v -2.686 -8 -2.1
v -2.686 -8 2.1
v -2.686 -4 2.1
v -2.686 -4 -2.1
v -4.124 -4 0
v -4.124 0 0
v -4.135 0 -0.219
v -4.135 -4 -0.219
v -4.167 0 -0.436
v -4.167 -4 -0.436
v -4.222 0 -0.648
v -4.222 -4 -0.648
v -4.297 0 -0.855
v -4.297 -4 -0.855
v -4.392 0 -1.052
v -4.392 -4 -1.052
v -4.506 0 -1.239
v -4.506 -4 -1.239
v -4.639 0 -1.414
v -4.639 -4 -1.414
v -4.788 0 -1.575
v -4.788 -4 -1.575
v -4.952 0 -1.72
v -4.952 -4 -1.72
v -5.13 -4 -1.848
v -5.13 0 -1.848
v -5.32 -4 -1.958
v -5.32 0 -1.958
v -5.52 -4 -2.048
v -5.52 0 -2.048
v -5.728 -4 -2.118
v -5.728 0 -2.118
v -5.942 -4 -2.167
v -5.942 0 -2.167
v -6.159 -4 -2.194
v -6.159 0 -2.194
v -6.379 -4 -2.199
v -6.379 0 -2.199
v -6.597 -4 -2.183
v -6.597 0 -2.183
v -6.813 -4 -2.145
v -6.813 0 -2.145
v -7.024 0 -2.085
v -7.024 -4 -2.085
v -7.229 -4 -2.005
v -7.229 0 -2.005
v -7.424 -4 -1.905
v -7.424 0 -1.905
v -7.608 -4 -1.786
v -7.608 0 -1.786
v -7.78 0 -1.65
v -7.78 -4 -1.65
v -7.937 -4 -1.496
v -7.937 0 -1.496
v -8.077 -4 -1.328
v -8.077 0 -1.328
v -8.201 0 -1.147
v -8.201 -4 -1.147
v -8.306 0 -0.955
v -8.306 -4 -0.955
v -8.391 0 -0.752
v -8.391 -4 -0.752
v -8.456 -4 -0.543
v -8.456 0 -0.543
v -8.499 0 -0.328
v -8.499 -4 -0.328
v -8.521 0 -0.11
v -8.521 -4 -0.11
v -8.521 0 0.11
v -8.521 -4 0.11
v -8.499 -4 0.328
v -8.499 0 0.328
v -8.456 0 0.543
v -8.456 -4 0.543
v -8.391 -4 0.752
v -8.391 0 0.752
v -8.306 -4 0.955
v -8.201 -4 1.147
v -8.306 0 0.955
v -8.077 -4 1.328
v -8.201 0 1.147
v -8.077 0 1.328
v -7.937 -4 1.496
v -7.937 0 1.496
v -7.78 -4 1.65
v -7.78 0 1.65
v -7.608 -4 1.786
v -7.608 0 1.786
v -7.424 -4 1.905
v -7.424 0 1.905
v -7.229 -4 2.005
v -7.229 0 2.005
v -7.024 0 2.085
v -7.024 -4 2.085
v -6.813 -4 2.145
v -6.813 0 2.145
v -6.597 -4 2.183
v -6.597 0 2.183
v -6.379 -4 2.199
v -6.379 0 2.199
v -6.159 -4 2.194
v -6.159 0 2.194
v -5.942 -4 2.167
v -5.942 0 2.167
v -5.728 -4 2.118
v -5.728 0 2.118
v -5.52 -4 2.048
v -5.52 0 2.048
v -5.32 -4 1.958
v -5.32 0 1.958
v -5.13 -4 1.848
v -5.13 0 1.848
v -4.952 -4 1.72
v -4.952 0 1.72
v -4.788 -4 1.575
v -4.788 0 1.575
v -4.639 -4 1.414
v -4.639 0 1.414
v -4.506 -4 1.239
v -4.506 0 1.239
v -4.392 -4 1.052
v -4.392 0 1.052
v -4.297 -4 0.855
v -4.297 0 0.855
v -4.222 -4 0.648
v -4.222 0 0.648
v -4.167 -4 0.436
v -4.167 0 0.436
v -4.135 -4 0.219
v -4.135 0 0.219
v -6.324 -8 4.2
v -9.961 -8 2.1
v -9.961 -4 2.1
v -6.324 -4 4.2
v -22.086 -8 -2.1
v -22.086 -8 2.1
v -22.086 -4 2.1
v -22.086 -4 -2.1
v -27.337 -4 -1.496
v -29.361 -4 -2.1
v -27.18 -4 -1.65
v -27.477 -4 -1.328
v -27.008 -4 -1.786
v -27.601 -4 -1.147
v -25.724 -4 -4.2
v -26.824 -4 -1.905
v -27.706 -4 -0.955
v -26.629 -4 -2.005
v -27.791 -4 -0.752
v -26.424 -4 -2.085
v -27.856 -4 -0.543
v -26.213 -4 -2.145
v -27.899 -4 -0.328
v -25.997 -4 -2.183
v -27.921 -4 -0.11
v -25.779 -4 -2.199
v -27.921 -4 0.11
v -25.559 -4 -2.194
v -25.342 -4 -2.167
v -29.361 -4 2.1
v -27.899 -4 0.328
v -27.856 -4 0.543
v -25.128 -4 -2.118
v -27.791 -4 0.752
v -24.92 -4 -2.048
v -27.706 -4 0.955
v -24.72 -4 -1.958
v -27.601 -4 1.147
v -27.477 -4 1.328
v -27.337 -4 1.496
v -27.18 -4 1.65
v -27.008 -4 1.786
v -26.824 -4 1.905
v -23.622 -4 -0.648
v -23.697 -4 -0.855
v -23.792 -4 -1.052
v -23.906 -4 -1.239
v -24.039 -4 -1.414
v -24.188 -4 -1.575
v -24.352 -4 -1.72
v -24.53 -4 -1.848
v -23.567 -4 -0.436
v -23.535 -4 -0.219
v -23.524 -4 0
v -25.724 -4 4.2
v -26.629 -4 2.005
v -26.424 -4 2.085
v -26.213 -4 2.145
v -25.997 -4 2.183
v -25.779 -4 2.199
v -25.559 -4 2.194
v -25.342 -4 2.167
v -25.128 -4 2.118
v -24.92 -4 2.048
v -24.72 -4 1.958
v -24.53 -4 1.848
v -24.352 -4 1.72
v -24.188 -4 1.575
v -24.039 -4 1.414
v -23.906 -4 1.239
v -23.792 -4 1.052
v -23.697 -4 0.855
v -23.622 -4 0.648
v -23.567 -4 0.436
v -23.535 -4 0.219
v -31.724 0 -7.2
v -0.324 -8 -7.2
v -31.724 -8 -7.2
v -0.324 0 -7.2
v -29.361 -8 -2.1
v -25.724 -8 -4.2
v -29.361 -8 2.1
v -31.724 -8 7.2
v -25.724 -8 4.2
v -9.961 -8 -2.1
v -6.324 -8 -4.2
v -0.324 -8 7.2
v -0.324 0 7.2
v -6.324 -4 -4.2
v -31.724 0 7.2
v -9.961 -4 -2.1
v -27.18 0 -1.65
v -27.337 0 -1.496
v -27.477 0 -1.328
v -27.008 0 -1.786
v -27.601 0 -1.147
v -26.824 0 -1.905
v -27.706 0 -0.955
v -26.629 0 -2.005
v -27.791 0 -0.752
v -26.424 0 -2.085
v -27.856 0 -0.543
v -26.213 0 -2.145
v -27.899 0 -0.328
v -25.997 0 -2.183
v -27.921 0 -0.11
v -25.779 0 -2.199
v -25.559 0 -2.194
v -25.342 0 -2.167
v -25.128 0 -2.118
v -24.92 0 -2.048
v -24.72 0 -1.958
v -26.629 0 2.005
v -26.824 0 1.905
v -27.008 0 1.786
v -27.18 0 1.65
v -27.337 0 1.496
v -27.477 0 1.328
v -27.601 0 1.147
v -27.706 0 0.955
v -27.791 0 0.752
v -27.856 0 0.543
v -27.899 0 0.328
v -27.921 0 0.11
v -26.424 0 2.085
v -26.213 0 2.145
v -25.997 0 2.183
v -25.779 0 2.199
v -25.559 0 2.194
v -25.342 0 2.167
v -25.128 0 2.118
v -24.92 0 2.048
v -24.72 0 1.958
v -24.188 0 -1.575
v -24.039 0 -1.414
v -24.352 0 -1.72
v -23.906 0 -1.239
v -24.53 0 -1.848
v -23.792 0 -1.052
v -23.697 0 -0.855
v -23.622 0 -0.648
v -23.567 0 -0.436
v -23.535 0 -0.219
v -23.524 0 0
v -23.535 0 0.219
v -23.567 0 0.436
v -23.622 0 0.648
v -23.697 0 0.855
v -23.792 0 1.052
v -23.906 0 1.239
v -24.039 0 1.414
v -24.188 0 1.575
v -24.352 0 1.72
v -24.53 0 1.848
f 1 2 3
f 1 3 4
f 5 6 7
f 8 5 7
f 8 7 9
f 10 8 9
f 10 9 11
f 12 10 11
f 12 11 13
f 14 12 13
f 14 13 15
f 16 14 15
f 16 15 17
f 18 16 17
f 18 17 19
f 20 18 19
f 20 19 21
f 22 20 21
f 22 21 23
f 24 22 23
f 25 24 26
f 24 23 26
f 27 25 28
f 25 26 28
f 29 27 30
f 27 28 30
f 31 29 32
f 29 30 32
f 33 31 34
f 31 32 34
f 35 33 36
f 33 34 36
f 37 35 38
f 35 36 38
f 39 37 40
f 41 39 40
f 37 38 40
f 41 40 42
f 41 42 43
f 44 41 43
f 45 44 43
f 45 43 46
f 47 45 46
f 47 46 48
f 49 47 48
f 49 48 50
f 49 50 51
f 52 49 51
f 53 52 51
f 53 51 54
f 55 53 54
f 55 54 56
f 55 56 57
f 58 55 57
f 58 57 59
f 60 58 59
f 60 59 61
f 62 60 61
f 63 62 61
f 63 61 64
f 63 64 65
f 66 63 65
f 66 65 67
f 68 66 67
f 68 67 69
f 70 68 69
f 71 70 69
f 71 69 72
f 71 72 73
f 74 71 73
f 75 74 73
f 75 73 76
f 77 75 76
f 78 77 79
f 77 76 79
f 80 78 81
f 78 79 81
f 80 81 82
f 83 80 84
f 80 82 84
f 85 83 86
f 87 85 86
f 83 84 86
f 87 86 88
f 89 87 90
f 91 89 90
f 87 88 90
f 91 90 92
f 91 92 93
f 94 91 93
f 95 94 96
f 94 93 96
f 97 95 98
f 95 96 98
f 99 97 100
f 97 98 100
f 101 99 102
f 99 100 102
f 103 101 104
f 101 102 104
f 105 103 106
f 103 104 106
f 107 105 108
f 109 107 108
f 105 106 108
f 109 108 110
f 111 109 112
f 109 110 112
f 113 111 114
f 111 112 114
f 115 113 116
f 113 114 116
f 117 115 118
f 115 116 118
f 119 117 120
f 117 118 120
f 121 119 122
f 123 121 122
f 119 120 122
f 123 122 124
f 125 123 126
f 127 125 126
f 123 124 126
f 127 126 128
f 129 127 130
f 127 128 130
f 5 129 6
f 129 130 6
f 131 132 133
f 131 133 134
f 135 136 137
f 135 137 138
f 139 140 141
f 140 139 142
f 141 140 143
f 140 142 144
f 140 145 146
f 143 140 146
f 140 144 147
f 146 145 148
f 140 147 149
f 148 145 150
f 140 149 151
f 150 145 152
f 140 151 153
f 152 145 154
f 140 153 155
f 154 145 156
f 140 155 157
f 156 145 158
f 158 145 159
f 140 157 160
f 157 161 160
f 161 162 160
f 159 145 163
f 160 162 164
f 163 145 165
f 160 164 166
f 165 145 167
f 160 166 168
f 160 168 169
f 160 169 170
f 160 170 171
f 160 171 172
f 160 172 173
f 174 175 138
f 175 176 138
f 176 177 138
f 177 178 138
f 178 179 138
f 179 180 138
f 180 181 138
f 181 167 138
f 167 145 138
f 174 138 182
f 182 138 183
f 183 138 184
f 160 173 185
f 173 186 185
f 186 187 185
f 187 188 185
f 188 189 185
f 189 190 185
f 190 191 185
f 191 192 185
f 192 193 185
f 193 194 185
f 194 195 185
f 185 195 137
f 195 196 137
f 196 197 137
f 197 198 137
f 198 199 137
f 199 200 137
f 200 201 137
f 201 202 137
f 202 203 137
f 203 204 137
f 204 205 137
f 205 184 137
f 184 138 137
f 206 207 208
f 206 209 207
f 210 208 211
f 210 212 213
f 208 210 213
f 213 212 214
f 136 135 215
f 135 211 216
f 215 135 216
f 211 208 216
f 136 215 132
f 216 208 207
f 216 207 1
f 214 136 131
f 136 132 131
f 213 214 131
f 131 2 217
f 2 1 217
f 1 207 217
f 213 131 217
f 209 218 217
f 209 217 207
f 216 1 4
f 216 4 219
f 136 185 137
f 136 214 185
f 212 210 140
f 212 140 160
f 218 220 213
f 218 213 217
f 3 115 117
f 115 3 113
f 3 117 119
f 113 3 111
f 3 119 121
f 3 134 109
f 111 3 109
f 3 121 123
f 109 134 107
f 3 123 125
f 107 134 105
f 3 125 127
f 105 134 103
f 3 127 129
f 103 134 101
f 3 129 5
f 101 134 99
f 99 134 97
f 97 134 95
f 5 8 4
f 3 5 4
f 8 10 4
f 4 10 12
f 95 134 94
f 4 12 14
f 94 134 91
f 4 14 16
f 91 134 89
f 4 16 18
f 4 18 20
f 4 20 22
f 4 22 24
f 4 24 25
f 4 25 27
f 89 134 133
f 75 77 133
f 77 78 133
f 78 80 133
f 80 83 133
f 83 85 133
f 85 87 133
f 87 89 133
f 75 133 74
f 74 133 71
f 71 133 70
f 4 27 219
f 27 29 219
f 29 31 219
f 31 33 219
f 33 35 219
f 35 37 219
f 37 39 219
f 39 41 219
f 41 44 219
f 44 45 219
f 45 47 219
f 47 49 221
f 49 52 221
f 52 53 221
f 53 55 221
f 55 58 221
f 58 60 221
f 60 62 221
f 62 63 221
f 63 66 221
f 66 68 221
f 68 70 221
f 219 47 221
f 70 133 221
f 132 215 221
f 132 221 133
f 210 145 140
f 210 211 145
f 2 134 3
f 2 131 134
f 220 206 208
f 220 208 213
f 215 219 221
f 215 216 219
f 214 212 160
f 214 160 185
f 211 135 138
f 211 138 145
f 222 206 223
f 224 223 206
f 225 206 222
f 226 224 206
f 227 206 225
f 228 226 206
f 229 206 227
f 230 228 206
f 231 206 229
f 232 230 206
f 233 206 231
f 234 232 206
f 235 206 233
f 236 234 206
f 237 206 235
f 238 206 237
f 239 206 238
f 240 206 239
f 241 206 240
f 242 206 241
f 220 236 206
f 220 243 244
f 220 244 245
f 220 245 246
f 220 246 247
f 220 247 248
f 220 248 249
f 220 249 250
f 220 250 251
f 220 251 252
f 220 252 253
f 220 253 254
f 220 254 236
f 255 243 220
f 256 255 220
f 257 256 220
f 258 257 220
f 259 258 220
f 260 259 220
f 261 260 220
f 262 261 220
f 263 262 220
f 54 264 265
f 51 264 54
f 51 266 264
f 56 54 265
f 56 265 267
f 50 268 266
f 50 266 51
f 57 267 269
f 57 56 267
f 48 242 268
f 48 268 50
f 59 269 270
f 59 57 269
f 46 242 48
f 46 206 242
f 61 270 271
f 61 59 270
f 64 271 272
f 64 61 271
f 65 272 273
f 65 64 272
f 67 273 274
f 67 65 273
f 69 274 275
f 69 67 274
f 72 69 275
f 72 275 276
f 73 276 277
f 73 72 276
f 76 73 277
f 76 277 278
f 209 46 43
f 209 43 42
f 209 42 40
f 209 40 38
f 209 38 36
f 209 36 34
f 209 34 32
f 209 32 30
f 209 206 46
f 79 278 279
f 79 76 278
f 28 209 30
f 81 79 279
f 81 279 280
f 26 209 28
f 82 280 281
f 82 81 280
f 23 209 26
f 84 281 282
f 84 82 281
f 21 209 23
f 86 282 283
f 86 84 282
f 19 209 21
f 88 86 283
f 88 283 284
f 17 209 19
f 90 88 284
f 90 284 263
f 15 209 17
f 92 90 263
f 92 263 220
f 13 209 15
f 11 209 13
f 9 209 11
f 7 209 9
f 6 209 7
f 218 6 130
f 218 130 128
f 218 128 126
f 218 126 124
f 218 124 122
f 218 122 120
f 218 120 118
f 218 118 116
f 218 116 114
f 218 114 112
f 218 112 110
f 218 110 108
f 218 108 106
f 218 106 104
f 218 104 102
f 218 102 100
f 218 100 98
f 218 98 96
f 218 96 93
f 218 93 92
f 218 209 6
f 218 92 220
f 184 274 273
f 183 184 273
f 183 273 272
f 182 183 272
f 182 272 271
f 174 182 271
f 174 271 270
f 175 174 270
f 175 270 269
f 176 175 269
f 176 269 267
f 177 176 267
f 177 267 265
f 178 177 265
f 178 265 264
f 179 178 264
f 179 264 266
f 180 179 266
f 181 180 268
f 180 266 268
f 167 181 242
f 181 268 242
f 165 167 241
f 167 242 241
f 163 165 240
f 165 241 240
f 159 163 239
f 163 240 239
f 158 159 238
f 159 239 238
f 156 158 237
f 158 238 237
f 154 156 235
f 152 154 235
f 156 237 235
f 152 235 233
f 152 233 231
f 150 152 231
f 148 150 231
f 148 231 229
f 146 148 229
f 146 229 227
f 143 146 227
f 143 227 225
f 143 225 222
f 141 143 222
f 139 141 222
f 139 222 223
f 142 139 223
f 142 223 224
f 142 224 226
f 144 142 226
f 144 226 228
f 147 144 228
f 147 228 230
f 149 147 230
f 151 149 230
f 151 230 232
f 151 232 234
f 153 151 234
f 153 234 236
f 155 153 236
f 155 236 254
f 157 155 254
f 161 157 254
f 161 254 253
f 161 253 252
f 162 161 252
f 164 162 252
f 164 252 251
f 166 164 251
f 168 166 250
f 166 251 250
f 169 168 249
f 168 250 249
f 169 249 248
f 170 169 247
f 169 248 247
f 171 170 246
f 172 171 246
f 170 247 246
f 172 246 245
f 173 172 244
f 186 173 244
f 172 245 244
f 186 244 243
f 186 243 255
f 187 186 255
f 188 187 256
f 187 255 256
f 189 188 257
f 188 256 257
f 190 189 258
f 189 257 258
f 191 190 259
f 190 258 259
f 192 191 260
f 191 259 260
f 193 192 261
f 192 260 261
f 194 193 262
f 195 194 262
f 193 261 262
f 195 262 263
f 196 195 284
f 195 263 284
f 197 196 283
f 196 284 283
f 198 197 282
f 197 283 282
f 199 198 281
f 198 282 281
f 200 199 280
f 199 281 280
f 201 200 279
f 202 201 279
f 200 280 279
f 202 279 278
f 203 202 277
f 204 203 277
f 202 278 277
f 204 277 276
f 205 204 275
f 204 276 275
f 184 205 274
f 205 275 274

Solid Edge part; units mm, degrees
sketch "Sketch1" plane through (0, 0, 0) normal (0, -1, 0) x (1, 0, 0)
  circle A0 centre (-6.3238, 0) radius 2.2
  line L0 (-31.7238, 7.2) -> (-0.3238, 7.2)
  line L1 (-0.3238, 7.2) -> (-0.3238, -7.2)
  line L2 (-0.3238, -7.2) -> (-31.7238, -7.2)
  line L3 (-31.7238, -7.2) -> (-31.7238, 7.2)
  circle A1 centre (-25.7238, 0) radius 2.2
  dimension "D1" = 19.4
  dimension "D2" = 6
  dimension "D3" = 4.4
  dimension "D4" = 4.4
  dimension "D5" = 7.2
  dimension "D6" = 7.2
  dimension "D7" = 6
extrude "Protrusion1" add sketch "Sketch1" along normal blind 8
sketch "Sketch2" plane through (-14.9238, -8, 0) normal (0, -1, 0) x (1, 0, 0)
  line L0 (-14.4373, -2.1) -> (-14.4373, 2.1)
  line L1 (-14.4373, 2.1) -> (-10.8, 4.2)
  line L2 (-10.8, 4.2) -> (-7.1627, 2.1)
  line L3 (-7.1627, 2.1) -> (-7.1627, -2.1)
  line L4 (-7.1627, -2.1) -> (-10.8, -4.2)
  line L5 (-10.8, -4.2) -> (-14.4373, -2.1)
  dimension "D1" = 8.4
extrude "ExtrudedCutout_1" cut sketch "Sketch2" against normal blind 4
mirror "Mirror1" about plane through (-16.0238, -4, 0) normal (-1, 0, 0) of "ExtrudedCutout_1"
